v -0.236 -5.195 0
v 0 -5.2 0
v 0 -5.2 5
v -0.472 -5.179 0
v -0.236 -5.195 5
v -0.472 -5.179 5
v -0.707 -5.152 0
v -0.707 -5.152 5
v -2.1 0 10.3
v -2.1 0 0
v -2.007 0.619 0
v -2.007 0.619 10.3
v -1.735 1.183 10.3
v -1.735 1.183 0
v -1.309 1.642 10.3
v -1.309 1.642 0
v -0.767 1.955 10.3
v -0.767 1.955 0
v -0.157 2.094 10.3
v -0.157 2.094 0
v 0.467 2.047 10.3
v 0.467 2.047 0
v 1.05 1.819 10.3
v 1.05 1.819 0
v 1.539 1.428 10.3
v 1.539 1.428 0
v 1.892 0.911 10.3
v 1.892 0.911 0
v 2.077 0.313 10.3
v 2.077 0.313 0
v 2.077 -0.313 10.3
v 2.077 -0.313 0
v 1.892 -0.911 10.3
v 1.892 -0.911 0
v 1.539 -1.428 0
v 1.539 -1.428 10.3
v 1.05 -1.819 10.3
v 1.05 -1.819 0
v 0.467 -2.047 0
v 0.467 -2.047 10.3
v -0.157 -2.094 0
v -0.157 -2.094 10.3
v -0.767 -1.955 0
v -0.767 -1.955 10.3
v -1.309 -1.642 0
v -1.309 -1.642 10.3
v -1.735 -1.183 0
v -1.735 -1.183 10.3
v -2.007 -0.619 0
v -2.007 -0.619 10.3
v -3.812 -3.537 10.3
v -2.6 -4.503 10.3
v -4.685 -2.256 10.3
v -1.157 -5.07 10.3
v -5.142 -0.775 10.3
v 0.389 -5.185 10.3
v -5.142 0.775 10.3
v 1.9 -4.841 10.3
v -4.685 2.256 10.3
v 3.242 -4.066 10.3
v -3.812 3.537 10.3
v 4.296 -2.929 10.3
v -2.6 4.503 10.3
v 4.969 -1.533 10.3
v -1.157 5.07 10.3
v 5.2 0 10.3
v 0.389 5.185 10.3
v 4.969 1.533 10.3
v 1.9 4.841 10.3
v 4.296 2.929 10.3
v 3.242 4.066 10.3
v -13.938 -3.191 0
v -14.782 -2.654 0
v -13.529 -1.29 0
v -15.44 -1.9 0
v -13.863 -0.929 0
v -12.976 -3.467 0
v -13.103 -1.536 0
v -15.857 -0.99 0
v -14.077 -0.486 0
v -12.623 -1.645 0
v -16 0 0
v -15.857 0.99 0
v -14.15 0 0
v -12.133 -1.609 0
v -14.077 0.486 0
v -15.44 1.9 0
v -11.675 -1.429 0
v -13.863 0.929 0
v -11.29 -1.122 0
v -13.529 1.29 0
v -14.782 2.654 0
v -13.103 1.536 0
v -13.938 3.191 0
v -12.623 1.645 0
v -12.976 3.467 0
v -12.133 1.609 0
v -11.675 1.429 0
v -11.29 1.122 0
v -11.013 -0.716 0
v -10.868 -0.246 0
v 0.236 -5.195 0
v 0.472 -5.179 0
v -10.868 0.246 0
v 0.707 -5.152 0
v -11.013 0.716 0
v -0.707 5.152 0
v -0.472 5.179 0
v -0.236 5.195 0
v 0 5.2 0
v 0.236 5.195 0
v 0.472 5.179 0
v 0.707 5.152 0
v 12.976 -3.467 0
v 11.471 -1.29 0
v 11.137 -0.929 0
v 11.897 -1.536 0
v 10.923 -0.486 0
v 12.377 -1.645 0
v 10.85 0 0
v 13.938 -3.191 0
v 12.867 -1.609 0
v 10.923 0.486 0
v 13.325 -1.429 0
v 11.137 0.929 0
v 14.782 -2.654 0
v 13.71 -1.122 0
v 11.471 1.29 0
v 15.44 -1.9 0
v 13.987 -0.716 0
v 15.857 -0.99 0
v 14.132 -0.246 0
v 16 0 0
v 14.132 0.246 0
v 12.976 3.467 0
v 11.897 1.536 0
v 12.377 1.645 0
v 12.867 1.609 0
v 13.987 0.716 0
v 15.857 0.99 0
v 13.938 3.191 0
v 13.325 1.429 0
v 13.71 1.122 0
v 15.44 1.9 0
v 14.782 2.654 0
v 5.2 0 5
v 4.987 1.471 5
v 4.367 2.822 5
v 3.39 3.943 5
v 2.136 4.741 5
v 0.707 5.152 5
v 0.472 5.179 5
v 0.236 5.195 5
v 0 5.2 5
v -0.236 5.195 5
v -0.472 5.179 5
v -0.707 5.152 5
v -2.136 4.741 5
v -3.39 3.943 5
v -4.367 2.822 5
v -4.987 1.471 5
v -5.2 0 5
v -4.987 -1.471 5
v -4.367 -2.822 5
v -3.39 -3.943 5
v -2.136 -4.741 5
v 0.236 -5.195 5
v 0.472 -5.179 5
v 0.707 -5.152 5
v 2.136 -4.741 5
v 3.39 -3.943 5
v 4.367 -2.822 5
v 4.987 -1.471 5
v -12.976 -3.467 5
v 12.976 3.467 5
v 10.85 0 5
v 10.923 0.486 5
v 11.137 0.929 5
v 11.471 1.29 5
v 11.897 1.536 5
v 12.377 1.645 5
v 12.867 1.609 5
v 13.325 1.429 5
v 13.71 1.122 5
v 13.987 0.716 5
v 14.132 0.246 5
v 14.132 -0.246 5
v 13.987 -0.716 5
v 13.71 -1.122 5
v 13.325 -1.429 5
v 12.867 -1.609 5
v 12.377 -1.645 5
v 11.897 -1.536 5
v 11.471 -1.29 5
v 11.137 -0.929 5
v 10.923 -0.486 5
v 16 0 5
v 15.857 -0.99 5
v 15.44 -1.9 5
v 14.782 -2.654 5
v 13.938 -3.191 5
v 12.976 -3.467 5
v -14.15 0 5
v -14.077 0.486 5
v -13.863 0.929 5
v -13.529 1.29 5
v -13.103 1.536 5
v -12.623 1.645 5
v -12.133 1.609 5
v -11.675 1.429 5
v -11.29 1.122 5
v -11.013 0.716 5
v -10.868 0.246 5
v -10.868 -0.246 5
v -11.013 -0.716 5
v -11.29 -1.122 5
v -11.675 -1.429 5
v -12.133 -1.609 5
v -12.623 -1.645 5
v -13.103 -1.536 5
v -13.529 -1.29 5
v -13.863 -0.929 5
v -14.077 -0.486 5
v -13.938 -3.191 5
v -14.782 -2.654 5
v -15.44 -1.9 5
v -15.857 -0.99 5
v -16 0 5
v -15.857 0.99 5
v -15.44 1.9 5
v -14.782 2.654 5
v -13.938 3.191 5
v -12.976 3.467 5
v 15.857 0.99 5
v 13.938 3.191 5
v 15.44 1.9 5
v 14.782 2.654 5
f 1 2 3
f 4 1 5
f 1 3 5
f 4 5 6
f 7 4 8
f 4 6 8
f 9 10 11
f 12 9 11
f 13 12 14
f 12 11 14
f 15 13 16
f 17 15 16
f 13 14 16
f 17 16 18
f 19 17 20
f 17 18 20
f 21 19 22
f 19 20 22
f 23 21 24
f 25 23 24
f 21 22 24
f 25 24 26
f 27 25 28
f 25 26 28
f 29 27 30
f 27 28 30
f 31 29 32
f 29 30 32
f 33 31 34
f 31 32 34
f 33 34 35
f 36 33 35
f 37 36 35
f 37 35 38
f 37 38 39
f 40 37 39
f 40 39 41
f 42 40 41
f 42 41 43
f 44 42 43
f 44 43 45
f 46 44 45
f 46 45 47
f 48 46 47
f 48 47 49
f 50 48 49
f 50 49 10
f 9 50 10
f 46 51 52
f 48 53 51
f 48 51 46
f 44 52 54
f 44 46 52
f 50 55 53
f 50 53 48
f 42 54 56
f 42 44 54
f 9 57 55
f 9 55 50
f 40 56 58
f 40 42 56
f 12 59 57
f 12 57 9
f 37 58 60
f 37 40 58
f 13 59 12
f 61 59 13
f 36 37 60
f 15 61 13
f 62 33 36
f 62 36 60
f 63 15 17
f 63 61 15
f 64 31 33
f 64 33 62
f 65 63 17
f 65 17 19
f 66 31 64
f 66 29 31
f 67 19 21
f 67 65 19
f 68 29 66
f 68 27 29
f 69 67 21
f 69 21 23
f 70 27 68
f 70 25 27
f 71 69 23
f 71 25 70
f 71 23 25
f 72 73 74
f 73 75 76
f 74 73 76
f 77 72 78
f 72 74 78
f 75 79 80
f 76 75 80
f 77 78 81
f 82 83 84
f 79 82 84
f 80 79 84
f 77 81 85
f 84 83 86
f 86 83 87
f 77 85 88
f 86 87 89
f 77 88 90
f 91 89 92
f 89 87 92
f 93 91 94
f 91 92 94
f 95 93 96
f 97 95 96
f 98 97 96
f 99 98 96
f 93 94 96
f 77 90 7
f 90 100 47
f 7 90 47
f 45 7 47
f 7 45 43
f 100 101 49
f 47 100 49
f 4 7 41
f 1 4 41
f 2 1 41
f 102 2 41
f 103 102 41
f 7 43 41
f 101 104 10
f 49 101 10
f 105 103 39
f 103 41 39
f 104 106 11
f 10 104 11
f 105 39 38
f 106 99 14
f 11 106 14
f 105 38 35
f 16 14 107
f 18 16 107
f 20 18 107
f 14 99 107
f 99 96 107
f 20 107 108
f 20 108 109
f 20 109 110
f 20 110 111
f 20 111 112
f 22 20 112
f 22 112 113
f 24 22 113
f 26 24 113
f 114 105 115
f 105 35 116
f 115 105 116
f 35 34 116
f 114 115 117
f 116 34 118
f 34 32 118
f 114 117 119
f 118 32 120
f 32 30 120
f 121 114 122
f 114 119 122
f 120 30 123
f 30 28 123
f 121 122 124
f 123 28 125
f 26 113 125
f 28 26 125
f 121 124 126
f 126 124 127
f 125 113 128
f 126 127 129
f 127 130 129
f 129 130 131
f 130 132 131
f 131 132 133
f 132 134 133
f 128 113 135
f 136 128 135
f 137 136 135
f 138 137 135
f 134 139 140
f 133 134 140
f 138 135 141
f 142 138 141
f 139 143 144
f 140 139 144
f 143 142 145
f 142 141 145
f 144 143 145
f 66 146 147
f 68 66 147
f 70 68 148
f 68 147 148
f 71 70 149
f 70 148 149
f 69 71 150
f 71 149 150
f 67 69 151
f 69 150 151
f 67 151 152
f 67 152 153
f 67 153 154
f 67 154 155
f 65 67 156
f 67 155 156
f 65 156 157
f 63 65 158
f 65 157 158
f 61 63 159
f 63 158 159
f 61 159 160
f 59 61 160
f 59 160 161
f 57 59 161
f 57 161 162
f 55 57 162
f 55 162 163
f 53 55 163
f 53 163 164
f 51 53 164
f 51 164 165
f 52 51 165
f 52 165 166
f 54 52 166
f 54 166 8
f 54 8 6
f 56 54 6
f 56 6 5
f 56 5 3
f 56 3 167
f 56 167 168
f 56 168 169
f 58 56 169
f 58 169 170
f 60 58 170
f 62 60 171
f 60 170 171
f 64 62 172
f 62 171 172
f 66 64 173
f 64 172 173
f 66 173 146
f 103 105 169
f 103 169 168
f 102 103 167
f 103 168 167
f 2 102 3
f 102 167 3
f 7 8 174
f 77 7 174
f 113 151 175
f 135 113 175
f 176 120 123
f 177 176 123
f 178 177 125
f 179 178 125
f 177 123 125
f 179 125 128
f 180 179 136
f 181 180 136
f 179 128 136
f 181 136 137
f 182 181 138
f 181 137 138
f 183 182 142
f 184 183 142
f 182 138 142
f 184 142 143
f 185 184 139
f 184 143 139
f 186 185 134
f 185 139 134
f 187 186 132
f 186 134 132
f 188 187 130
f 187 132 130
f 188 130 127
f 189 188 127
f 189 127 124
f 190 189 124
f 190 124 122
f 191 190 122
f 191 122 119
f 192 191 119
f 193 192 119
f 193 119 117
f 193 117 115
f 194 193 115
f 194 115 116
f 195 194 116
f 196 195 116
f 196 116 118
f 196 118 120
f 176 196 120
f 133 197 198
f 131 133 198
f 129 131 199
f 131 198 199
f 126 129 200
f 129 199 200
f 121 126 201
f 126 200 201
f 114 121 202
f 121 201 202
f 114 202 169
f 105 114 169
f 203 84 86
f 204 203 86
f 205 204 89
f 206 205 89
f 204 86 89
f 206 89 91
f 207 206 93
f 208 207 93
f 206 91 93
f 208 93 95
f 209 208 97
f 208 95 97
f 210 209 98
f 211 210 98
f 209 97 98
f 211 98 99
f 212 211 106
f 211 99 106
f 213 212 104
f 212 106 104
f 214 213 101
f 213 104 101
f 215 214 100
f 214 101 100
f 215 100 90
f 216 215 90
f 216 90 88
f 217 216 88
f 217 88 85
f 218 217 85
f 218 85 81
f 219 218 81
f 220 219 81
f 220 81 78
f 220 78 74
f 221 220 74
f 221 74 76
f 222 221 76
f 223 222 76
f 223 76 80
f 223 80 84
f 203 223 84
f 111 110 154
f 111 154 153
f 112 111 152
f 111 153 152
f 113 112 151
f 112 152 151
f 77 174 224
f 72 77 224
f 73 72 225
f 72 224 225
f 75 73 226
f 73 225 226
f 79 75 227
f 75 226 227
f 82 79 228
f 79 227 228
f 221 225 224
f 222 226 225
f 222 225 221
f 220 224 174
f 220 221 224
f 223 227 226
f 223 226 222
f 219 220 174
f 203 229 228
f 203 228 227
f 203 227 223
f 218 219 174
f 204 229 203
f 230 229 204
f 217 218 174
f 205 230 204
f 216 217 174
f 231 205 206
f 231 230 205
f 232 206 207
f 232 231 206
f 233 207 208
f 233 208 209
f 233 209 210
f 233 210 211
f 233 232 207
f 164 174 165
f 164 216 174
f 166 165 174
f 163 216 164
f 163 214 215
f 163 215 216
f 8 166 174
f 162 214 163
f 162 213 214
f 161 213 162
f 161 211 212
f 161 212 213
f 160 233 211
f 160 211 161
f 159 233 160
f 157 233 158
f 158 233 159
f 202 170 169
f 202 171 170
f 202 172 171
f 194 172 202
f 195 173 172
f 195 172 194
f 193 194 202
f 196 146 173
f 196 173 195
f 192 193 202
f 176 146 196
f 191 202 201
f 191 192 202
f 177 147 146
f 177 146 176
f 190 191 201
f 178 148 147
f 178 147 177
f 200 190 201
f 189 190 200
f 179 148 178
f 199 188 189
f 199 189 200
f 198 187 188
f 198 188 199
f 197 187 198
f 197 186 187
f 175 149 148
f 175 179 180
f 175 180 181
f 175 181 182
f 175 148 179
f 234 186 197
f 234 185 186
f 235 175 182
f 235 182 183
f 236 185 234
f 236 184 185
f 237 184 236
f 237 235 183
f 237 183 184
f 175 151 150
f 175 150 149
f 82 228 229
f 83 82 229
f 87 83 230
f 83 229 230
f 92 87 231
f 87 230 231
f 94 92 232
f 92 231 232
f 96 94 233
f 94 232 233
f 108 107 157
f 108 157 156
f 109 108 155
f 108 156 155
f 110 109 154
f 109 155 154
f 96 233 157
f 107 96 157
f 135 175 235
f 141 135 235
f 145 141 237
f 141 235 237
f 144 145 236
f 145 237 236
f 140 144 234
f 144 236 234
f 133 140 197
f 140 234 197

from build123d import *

# Parameters (mm, degrees)
SKETCH_1_W             = 32
SKETCH_1_H             = 10.4
SKETCH_1_R             = 0.5
EXTRUDE_1_DEPTH        = 5
SKETCH_2_R             = 5.2
SKETCH_2_R_2           = 0.5
EXTRUDE_2_DEPTH        = 5.3
CUT_EXTRUDE_1_DEPTH    = 5.3
HOLE_WIZARD_M4_1_D     = 3.3
HOLE_WIZARD_M4_1_DEPTH = 10.1
HOLE_WIZARD_M4_1_TIP   = 0.991420021
HOLE_WIZARD_M5_1_D     = 4.2
HOLE_WIZARD_M5_1_DEPTH = 22.4
HOLE_WIZARD_M5_1_TIP   = 1.2618073


with BuildPart() as part:
    # 草图1 → 凸台-拉伸1 (new body)
    with BuildSketch(Plane.XY):
        Rectangle(SKETCH_1_W, SKETCH_1_H)
        with Locations((-12.5, 0)):
            Circle(SKETCH_1_R, mode=Mode.SUBTRACT)
        with Locations((12.5, 0)):
            Circle(SKETCH_1_R, mode=Mode.SUBTRACT)
        Circle(SKETCH_1_R, mode=Mode.SUBTRACT)
    extrude(amount=EXTRUDE_1_DEPTH)

    # 草图2 → 凸台-拉伸2 (add)
    with BuildSketch(Plane.XY.offset(5)):
        Circle(SKETCH_2_R)
        Circle(SKETCH_2_R_2, mode=Mode.SUBTRACT)
    extrude(amount=EXTRUDE_2_DEPTH)

    # 草图3 → 切除-拉伸1 (cut)
    with BuildSketch(Plane.XY.offset(5)):
        with BuildLine():
            Line((-12.976, 3.46748093), (-0.7072, 5.151685953))
            ThreePointArc((-0.7072, 5.151685953), (-0.354424212, 5.187907428), (0, 5.2))
            Line((0, 5.2), (-16, 5.2))
            Line((-16, 5.2), (-16, 0))
            ThreePointArc((-16, 0), (-15.137802115, 2.300434742), (-12.976, 3.46748093))
        make_face()
        with BuildLine():
            ThreePointArc((0, -5.2), (-0.354424212, -5.187907428), (-0.7072, -5.151685953))
            Line((-0.7072, -5.151685953), (-12.976, -3.46748093))
            ThreePointArc((-12.976, -3.46748093), (-15.137802115, -2.300434742), (-16, 0))
            Line((-16, 0), (-16, -5.2))
            Line((-16, -5.2), (0, -5.2))
        make_face()
        with BuildLine():
            ThreePointArc((0.7072, -5.151685953), (0.354424212, -5.187907428), (0, -5.2))
            Line((0, -5.2), (16, -5.2))
            Line((16, -5.2), (16, 0))
            ThreePointArc((16, 0), (15.137802115, -2.300434742), (12.976, -3.46748093))
            Line((12.976, -3.46748093), (0.7072, -5.151685953))
        make_face()
        with BuildLine():
            Line((16, 5.2), (0, 5.2))
            ThreePointArc((0, 5.2), (0.354424212, 5.187907428), (0.7072, 5.151685953))
            Line((0.7072, 5.151685953), (12.976, 3.46748093))
            ThreePointArc((12.976, 3.46748093), (15.137802115, 2.300434742), (16, 0))
            Line((16, 0), (16, 5.2))
        make_face()
    extrude(amount=-CUT_EXTRUDE_1_DEPTH, mode=Mode.SUBTRACT)

    # M4 螺纹孔1
    with Locations(Plane.XY.offset(5)):
        with Locations((-12.5, 0), (12.5, 0)):
            Hole(HOLE_WIZARD_M4_1_D / 2, depth=HOLE_WIZARD_M4_1_DEPTH)
            with Locations((0, 0, -(HOLE_WIZARD_M4_1_DEPTH + HOLE_WIZARD_M4_1_TIP / 2))):  # 118° drill point
                Cone(0, HOLE_WIZARD_M4_1_D / 2, HOLE_WIZARD_M4_1_TIP, mode=Mode.SUBTRACT)

    # M5 螺纹孔1
    with Locations(Plane.XY.offset(10.3)):
        with Locations((0, 0)):
            Hole(HOLE_WIZARD_M5_1_D / 2, depth=HOLE_WIZARD_M5_1_DEPTH)
            with Locations((0, 0, -(HOLE_WIZARD_M5_1_DEPTH + HOLE_WIZARD_M5_1_TIP / 2))):  # 118° drill point
                Cone(0, HOLE_WIZARD_M5_1_D / 2, HOLE_WIZARD_M5_1_TIP, mode=Mode.SUBTRACT)


solid = part.part
